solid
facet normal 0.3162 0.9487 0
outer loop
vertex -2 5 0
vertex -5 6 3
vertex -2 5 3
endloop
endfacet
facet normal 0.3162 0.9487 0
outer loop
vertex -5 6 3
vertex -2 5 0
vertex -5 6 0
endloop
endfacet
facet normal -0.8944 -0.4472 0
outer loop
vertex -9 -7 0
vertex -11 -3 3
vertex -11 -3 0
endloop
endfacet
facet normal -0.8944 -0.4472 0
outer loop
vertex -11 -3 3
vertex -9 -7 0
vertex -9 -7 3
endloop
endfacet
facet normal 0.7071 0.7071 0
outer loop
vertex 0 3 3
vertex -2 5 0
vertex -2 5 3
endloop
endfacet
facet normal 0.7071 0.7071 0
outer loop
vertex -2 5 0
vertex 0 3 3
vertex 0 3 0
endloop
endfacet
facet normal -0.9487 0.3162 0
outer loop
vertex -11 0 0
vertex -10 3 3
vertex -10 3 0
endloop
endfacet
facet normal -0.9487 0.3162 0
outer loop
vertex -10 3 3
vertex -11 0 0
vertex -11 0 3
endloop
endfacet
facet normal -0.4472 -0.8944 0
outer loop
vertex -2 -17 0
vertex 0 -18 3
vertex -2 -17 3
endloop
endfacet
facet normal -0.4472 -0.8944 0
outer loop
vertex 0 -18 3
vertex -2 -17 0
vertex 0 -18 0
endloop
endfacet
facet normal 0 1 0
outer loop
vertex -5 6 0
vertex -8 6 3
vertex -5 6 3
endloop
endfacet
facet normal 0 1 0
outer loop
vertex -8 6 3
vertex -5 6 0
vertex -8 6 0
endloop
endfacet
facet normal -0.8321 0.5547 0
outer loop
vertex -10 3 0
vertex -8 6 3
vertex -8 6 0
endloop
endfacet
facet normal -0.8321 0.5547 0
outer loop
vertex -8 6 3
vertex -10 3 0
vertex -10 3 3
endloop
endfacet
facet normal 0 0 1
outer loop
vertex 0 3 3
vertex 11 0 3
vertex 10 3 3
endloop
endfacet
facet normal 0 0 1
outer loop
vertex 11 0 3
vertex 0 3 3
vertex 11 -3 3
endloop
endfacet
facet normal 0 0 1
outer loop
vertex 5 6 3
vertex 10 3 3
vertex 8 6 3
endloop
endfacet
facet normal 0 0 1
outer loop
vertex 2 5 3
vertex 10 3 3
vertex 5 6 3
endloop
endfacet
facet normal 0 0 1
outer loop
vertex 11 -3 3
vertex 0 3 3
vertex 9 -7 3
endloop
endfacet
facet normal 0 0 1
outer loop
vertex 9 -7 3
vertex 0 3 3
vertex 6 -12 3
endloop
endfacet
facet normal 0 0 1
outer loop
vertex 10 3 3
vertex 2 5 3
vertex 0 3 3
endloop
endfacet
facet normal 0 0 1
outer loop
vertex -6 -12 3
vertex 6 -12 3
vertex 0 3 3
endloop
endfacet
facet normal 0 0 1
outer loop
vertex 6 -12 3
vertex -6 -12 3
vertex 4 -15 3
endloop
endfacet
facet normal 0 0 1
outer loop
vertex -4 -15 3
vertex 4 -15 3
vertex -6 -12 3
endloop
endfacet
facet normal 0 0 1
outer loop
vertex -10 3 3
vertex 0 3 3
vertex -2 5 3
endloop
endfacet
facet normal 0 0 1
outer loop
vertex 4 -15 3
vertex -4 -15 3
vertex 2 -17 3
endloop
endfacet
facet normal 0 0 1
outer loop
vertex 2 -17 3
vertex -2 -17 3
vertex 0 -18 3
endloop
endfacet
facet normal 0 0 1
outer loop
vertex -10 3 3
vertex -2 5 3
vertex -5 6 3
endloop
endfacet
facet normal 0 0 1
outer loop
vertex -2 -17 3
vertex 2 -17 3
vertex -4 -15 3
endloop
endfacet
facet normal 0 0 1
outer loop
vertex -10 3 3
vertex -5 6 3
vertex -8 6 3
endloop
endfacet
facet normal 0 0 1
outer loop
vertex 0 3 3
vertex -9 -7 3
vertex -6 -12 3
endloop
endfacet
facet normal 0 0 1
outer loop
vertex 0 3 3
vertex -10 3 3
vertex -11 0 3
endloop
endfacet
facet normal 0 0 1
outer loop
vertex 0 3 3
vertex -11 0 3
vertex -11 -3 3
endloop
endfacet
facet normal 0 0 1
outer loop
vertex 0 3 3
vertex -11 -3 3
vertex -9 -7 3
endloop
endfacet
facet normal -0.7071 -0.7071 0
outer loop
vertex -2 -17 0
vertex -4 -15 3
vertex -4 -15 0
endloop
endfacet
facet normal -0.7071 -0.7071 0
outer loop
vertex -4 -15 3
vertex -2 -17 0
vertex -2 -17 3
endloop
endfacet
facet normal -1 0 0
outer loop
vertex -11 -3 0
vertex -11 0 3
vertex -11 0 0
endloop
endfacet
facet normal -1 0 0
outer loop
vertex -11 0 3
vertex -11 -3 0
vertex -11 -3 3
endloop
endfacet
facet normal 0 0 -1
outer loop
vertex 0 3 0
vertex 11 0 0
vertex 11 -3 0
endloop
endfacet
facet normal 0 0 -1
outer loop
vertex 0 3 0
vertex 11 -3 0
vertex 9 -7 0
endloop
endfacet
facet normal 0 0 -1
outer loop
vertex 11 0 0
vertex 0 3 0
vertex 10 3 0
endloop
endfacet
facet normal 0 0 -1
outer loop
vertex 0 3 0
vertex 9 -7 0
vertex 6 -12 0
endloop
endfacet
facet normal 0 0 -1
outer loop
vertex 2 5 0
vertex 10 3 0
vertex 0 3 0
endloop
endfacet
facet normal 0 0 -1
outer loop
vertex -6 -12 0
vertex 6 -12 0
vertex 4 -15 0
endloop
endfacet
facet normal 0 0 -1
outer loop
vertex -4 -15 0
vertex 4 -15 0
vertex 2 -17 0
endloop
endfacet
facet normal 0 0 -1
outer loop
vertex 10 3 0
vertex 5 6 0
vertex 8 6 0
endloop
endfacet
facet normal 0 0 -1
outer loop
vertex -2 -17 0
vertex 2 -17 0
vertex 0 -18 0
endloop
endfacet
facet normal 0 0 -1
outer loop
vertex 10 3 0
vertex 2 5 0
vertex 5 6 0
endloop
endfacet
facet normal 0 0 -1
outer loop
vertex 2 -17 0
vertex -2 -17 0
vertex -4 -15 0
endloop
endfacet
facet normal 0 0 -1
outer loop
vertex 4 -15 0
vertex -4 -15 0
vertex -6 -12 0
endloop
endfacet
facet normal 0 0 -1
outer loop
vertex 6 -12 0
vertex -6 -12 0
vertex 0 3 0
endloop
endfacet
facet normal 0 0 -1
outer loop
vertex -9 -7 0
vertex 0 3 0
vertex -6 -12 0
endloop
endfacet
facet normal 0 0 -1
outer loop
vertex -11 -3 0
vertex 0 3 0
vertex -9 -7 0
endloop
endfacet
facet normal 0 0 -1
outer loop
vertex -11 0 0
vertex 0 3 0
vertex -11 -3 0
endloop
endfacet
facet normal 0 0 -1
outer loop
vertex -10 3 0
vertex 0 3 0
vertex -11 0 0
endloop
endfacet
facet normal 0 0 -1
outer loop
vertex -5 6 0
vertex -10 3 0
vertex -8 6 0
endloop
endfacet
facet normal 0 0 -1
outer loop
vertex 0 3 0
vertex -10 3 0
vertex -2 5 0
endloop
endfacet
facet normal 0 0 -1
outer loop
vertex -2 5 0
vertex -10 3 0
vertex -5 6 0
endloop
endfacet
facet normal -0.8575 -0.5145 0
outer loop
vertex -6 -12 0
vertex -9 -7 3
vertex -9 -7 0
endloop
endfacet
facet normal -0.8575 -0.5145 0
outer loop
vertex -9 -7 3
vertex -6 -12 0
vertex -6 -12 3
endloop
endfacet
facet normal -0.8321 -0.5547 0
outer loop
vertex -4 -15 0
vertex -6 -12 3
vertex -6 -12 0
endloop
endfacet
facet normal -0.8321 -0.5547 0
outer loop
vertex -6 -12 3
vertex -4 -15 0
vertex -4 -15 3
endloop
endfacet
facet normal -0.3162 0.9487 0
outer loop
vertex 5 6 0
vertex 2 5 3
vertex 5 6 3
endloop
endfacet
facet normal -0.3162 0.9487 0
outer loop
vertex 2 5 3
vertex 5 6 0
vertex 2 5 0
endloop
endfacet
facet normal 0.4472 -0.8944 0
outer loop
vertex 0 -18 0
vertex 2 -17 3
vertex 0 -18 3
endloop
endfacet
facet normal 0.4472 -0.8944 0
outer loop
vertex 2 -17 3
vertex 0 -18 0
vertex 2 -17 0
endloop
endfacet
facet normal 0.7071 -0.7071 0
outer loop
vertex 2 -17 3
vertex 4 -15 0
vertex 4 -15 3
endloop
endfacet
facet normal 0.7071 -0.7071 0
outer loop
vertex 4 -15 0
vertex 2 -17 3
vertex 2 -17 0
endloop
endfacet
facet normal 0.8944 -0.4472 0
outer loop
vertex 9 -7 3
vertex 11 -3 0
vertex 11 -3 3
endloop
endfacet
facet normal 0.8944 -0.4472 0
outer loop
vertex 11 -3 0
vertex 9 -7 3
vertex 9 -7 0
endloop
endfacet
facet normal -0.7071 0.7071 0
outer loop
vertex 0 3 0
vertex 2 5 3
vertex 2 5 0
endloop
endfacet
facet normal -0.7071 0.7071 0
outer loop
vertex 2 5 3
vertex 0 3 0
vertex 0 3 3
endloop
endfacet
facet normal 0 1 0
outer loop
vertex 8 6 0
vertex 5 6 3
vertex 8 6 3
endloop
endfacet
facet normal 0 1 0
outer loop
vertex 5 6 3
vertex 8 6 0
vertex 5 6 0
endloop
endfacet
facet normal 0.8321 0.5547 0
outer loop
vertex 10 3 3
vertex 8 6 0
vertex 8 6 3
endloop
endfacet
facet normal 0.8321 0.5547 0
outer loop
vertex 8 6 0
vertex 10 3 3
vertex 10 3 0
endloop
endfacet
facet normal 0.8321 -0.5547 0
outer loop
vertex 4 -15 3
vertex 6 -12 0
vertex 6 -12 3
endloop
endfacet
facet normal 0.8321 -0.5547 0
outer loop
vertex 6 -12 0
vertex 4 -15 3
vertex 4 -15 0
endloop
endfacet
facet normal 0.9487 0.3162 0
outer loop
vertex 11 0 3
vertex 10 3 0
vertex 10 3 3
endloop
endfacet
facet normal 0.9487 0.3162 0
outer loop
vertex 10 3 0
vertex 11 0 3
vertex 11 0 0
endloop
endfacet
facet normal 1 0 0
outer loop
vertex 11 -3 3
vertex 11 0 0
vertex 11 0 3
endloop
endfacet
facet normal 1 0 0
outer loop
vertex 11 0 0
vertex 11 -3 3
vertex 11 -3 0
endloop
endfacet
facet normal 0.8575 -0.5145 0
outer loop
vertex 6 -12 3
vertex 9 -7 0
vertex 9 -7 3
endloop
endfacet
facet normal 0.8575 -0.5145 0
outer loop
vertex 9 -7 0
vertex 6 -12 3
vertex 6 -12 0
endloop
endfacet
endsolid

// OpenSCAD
//start
module  bisecHeart() { 
	color  ([0.6,0.6,0.6]) { 
    polygon(
      points = [
        [15.00,3.00]
        ,[13.00,5.00]
        ,[10.00,6.00]
        ,[7.00,6.00]
        ,[5.00,3.00]
        ,[4.00,0.00]
        ,[4.00,-3.00]
        ,[6.00,-7.00]
        ,[9.00,-12.00]
        ,[11.00,-15.00]
        ,[13.00,-17.00]
        ,[15.00,-18.00]],
      paths = [[0,1,2,3,4,5,6,7,8,9,10,11]]
    );
  }
}

	translate([-15,0,0])
	color("red")
	linear_extrude(height = 3)
	bisecHeart();

	translate([15,0,3])
	color("red")
	rotate(a=[0,180,0])
	linear_extrude(height = 3)
	bisecHeart();
